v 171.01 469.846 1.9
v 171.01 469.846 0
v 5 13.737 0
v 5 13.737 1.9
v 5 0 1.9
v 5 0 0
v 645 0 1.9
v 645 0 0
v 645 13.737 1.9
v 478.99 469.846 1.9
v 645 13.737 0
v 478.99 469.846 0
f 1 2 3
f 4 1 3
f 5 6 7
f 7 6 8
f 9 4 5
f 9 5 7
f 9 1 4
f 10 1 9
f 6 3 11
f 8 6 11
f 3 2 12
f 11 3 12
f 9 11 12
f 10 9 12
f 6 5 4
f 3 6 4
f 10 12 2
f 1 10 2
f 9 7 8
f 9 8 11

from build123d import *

# Parameters (mm, degrees)
SALIENTE_EXTRUIR1_DEPTH = 1.9
CROQUIS2_W              = 5
CROQUIS2_H              = 30.827719102
CROQUIS2_H_2            = 21.572663196
CORTAR_EXTRUIR1_DEPTH   = 10


with BuildPart() as part:
    # Croquis1 → Saliente-Extruir1 (new body)
    with BuildSketch(Plane.XY):
        Polygon((0, 0), (650, 0), (478.989928337, 469.846310393), (171.010071663, 469.846310393), align=None)
    extrude(amount=SALIENTE_EXTRUIR1_DEPTH)

    # Croquis2 → Cortar-Extruir1 (cut)
    with BuildSketch(Plane.XY.offset(1.9)):
        with Locations((647.5, 15.413859551)):
            Rectangle(CROQUIS2_W, CROQUIS2_H)
        with Locations((2.5, 10.786331598)):
            Rectangle(CROQUIS2_W, CROQUIS2_H_2)
    extrude(amount=-CORTAR_EXTRUIR1_DEPTH, mode=Mode.SUBTRACT)


solid = part.part
